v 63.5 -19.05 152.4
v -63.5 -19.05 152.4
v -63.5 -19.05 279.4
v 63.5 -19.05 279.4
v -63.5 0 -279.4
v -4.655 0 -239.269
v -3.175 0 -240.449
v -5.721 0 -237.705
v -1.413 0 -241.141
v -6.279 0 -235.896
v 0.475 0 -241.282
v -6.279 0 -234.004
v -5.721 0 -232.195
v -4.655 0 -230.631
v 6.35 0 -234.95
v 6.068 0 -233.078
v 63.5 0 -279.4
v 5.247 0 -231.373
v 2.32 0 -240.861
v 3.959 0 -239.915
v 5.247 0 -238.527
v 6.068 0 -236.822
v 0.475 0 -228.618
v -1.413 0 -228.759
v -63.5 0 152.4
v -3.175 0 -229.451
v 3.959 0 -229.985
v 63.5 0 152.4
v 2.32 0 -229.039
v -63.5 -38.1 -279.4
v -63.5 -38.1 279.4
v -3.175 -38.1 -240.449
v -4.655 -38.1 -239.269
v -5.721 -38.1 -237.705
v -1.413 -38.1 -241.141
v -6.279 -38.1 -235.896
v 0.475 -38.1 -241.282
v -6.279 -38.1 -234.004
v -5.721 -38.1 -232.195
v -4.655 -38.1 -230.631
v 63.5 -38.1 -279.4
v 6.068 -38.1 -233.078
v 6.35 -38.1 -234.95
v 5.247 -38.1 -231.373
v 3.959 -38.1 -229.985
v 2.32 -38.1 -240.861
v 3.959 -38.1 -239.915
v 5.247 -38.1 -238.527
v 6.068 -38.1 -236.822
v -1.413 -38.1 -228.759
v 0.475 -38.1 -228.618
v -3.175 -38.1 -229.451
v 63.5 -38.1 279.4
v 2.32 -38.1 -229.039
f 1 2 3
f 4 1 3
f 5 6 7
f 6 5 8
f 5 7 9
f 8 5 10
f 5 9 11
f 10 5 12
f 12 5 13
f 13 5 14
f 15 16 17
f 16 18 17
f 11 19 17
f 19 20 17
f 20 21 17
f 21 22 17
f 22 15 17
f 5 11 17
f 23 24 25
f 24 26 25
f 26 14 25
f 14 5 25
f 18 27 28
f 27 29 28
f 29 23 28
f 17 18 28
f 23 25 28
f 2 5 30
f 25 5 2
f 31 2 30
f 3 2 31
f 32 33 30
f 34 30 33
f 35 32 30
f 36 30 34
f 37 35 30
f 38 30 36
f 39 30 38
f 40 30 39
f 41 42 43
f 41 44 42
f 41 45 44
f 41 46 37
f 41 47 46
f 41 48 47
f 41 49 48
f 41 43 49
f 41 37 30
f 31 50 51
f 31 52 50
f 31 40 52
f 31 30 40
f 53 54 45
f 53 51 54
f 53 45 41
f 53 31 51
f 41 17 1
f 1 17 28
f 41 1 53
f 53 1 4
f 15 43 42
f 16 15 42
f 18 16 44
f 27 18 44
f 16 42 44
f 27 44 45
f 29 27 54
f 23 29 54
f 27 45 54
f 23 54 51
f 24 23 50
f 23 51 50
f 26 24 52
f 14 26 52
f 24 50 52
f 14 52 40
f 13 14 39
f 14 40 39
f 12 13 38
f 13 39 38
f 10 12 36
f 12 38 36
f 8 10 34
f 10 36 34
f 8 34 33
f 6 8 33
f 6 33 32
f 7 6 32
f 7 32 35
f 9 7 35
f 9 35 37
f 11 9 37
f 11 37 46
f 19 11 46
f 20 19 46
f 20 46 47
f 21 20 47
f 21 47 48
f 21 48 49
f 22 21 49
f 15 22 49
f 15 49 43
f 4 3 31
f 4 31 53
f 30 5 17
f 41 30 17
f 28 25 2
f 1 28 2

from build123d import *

# Parameters (mm, degrees)
F0_W     = 127
F0_H     = 558.8
F1_DEPTH = 38.1
F2_W     = 19.05
F2_H     = 127
F3_DEPTH = 152.4
F4_R     = 6.35
F5_DEPTH = 38.101


with BuildPart() as f1:
    # F0 (on Front) → F1 (new body)
    with BuildSketch(Plane.XZ):
        Rectangle(F0_W, F0_H)
    extrude(amount=F1_DEPTH)

    # F2 (on face) → F3 (cut)
    with BuildSketch(Plane(origin=(-63.5, 0, 0), x_dir=(0, -1, 0), z_dir=(-1, 0, 0))):
        with Locations((9.525, 215.9)):
            Rectangle(F2_W, F2_H)
    extrude(amount=-F3_DEPTH, mode=Mode.SUBTRACT)

    # F4 (on face) → F5 (cut, through all)
    with BuildSketch(Plane.XZ.offset(38.1)):
        with Locations((0, -234.95)):
            Circle(F4_R)
    extrude(amount=-F5_DEPTH, mode=Mode.SUBTRACT)


solid = f1.part
